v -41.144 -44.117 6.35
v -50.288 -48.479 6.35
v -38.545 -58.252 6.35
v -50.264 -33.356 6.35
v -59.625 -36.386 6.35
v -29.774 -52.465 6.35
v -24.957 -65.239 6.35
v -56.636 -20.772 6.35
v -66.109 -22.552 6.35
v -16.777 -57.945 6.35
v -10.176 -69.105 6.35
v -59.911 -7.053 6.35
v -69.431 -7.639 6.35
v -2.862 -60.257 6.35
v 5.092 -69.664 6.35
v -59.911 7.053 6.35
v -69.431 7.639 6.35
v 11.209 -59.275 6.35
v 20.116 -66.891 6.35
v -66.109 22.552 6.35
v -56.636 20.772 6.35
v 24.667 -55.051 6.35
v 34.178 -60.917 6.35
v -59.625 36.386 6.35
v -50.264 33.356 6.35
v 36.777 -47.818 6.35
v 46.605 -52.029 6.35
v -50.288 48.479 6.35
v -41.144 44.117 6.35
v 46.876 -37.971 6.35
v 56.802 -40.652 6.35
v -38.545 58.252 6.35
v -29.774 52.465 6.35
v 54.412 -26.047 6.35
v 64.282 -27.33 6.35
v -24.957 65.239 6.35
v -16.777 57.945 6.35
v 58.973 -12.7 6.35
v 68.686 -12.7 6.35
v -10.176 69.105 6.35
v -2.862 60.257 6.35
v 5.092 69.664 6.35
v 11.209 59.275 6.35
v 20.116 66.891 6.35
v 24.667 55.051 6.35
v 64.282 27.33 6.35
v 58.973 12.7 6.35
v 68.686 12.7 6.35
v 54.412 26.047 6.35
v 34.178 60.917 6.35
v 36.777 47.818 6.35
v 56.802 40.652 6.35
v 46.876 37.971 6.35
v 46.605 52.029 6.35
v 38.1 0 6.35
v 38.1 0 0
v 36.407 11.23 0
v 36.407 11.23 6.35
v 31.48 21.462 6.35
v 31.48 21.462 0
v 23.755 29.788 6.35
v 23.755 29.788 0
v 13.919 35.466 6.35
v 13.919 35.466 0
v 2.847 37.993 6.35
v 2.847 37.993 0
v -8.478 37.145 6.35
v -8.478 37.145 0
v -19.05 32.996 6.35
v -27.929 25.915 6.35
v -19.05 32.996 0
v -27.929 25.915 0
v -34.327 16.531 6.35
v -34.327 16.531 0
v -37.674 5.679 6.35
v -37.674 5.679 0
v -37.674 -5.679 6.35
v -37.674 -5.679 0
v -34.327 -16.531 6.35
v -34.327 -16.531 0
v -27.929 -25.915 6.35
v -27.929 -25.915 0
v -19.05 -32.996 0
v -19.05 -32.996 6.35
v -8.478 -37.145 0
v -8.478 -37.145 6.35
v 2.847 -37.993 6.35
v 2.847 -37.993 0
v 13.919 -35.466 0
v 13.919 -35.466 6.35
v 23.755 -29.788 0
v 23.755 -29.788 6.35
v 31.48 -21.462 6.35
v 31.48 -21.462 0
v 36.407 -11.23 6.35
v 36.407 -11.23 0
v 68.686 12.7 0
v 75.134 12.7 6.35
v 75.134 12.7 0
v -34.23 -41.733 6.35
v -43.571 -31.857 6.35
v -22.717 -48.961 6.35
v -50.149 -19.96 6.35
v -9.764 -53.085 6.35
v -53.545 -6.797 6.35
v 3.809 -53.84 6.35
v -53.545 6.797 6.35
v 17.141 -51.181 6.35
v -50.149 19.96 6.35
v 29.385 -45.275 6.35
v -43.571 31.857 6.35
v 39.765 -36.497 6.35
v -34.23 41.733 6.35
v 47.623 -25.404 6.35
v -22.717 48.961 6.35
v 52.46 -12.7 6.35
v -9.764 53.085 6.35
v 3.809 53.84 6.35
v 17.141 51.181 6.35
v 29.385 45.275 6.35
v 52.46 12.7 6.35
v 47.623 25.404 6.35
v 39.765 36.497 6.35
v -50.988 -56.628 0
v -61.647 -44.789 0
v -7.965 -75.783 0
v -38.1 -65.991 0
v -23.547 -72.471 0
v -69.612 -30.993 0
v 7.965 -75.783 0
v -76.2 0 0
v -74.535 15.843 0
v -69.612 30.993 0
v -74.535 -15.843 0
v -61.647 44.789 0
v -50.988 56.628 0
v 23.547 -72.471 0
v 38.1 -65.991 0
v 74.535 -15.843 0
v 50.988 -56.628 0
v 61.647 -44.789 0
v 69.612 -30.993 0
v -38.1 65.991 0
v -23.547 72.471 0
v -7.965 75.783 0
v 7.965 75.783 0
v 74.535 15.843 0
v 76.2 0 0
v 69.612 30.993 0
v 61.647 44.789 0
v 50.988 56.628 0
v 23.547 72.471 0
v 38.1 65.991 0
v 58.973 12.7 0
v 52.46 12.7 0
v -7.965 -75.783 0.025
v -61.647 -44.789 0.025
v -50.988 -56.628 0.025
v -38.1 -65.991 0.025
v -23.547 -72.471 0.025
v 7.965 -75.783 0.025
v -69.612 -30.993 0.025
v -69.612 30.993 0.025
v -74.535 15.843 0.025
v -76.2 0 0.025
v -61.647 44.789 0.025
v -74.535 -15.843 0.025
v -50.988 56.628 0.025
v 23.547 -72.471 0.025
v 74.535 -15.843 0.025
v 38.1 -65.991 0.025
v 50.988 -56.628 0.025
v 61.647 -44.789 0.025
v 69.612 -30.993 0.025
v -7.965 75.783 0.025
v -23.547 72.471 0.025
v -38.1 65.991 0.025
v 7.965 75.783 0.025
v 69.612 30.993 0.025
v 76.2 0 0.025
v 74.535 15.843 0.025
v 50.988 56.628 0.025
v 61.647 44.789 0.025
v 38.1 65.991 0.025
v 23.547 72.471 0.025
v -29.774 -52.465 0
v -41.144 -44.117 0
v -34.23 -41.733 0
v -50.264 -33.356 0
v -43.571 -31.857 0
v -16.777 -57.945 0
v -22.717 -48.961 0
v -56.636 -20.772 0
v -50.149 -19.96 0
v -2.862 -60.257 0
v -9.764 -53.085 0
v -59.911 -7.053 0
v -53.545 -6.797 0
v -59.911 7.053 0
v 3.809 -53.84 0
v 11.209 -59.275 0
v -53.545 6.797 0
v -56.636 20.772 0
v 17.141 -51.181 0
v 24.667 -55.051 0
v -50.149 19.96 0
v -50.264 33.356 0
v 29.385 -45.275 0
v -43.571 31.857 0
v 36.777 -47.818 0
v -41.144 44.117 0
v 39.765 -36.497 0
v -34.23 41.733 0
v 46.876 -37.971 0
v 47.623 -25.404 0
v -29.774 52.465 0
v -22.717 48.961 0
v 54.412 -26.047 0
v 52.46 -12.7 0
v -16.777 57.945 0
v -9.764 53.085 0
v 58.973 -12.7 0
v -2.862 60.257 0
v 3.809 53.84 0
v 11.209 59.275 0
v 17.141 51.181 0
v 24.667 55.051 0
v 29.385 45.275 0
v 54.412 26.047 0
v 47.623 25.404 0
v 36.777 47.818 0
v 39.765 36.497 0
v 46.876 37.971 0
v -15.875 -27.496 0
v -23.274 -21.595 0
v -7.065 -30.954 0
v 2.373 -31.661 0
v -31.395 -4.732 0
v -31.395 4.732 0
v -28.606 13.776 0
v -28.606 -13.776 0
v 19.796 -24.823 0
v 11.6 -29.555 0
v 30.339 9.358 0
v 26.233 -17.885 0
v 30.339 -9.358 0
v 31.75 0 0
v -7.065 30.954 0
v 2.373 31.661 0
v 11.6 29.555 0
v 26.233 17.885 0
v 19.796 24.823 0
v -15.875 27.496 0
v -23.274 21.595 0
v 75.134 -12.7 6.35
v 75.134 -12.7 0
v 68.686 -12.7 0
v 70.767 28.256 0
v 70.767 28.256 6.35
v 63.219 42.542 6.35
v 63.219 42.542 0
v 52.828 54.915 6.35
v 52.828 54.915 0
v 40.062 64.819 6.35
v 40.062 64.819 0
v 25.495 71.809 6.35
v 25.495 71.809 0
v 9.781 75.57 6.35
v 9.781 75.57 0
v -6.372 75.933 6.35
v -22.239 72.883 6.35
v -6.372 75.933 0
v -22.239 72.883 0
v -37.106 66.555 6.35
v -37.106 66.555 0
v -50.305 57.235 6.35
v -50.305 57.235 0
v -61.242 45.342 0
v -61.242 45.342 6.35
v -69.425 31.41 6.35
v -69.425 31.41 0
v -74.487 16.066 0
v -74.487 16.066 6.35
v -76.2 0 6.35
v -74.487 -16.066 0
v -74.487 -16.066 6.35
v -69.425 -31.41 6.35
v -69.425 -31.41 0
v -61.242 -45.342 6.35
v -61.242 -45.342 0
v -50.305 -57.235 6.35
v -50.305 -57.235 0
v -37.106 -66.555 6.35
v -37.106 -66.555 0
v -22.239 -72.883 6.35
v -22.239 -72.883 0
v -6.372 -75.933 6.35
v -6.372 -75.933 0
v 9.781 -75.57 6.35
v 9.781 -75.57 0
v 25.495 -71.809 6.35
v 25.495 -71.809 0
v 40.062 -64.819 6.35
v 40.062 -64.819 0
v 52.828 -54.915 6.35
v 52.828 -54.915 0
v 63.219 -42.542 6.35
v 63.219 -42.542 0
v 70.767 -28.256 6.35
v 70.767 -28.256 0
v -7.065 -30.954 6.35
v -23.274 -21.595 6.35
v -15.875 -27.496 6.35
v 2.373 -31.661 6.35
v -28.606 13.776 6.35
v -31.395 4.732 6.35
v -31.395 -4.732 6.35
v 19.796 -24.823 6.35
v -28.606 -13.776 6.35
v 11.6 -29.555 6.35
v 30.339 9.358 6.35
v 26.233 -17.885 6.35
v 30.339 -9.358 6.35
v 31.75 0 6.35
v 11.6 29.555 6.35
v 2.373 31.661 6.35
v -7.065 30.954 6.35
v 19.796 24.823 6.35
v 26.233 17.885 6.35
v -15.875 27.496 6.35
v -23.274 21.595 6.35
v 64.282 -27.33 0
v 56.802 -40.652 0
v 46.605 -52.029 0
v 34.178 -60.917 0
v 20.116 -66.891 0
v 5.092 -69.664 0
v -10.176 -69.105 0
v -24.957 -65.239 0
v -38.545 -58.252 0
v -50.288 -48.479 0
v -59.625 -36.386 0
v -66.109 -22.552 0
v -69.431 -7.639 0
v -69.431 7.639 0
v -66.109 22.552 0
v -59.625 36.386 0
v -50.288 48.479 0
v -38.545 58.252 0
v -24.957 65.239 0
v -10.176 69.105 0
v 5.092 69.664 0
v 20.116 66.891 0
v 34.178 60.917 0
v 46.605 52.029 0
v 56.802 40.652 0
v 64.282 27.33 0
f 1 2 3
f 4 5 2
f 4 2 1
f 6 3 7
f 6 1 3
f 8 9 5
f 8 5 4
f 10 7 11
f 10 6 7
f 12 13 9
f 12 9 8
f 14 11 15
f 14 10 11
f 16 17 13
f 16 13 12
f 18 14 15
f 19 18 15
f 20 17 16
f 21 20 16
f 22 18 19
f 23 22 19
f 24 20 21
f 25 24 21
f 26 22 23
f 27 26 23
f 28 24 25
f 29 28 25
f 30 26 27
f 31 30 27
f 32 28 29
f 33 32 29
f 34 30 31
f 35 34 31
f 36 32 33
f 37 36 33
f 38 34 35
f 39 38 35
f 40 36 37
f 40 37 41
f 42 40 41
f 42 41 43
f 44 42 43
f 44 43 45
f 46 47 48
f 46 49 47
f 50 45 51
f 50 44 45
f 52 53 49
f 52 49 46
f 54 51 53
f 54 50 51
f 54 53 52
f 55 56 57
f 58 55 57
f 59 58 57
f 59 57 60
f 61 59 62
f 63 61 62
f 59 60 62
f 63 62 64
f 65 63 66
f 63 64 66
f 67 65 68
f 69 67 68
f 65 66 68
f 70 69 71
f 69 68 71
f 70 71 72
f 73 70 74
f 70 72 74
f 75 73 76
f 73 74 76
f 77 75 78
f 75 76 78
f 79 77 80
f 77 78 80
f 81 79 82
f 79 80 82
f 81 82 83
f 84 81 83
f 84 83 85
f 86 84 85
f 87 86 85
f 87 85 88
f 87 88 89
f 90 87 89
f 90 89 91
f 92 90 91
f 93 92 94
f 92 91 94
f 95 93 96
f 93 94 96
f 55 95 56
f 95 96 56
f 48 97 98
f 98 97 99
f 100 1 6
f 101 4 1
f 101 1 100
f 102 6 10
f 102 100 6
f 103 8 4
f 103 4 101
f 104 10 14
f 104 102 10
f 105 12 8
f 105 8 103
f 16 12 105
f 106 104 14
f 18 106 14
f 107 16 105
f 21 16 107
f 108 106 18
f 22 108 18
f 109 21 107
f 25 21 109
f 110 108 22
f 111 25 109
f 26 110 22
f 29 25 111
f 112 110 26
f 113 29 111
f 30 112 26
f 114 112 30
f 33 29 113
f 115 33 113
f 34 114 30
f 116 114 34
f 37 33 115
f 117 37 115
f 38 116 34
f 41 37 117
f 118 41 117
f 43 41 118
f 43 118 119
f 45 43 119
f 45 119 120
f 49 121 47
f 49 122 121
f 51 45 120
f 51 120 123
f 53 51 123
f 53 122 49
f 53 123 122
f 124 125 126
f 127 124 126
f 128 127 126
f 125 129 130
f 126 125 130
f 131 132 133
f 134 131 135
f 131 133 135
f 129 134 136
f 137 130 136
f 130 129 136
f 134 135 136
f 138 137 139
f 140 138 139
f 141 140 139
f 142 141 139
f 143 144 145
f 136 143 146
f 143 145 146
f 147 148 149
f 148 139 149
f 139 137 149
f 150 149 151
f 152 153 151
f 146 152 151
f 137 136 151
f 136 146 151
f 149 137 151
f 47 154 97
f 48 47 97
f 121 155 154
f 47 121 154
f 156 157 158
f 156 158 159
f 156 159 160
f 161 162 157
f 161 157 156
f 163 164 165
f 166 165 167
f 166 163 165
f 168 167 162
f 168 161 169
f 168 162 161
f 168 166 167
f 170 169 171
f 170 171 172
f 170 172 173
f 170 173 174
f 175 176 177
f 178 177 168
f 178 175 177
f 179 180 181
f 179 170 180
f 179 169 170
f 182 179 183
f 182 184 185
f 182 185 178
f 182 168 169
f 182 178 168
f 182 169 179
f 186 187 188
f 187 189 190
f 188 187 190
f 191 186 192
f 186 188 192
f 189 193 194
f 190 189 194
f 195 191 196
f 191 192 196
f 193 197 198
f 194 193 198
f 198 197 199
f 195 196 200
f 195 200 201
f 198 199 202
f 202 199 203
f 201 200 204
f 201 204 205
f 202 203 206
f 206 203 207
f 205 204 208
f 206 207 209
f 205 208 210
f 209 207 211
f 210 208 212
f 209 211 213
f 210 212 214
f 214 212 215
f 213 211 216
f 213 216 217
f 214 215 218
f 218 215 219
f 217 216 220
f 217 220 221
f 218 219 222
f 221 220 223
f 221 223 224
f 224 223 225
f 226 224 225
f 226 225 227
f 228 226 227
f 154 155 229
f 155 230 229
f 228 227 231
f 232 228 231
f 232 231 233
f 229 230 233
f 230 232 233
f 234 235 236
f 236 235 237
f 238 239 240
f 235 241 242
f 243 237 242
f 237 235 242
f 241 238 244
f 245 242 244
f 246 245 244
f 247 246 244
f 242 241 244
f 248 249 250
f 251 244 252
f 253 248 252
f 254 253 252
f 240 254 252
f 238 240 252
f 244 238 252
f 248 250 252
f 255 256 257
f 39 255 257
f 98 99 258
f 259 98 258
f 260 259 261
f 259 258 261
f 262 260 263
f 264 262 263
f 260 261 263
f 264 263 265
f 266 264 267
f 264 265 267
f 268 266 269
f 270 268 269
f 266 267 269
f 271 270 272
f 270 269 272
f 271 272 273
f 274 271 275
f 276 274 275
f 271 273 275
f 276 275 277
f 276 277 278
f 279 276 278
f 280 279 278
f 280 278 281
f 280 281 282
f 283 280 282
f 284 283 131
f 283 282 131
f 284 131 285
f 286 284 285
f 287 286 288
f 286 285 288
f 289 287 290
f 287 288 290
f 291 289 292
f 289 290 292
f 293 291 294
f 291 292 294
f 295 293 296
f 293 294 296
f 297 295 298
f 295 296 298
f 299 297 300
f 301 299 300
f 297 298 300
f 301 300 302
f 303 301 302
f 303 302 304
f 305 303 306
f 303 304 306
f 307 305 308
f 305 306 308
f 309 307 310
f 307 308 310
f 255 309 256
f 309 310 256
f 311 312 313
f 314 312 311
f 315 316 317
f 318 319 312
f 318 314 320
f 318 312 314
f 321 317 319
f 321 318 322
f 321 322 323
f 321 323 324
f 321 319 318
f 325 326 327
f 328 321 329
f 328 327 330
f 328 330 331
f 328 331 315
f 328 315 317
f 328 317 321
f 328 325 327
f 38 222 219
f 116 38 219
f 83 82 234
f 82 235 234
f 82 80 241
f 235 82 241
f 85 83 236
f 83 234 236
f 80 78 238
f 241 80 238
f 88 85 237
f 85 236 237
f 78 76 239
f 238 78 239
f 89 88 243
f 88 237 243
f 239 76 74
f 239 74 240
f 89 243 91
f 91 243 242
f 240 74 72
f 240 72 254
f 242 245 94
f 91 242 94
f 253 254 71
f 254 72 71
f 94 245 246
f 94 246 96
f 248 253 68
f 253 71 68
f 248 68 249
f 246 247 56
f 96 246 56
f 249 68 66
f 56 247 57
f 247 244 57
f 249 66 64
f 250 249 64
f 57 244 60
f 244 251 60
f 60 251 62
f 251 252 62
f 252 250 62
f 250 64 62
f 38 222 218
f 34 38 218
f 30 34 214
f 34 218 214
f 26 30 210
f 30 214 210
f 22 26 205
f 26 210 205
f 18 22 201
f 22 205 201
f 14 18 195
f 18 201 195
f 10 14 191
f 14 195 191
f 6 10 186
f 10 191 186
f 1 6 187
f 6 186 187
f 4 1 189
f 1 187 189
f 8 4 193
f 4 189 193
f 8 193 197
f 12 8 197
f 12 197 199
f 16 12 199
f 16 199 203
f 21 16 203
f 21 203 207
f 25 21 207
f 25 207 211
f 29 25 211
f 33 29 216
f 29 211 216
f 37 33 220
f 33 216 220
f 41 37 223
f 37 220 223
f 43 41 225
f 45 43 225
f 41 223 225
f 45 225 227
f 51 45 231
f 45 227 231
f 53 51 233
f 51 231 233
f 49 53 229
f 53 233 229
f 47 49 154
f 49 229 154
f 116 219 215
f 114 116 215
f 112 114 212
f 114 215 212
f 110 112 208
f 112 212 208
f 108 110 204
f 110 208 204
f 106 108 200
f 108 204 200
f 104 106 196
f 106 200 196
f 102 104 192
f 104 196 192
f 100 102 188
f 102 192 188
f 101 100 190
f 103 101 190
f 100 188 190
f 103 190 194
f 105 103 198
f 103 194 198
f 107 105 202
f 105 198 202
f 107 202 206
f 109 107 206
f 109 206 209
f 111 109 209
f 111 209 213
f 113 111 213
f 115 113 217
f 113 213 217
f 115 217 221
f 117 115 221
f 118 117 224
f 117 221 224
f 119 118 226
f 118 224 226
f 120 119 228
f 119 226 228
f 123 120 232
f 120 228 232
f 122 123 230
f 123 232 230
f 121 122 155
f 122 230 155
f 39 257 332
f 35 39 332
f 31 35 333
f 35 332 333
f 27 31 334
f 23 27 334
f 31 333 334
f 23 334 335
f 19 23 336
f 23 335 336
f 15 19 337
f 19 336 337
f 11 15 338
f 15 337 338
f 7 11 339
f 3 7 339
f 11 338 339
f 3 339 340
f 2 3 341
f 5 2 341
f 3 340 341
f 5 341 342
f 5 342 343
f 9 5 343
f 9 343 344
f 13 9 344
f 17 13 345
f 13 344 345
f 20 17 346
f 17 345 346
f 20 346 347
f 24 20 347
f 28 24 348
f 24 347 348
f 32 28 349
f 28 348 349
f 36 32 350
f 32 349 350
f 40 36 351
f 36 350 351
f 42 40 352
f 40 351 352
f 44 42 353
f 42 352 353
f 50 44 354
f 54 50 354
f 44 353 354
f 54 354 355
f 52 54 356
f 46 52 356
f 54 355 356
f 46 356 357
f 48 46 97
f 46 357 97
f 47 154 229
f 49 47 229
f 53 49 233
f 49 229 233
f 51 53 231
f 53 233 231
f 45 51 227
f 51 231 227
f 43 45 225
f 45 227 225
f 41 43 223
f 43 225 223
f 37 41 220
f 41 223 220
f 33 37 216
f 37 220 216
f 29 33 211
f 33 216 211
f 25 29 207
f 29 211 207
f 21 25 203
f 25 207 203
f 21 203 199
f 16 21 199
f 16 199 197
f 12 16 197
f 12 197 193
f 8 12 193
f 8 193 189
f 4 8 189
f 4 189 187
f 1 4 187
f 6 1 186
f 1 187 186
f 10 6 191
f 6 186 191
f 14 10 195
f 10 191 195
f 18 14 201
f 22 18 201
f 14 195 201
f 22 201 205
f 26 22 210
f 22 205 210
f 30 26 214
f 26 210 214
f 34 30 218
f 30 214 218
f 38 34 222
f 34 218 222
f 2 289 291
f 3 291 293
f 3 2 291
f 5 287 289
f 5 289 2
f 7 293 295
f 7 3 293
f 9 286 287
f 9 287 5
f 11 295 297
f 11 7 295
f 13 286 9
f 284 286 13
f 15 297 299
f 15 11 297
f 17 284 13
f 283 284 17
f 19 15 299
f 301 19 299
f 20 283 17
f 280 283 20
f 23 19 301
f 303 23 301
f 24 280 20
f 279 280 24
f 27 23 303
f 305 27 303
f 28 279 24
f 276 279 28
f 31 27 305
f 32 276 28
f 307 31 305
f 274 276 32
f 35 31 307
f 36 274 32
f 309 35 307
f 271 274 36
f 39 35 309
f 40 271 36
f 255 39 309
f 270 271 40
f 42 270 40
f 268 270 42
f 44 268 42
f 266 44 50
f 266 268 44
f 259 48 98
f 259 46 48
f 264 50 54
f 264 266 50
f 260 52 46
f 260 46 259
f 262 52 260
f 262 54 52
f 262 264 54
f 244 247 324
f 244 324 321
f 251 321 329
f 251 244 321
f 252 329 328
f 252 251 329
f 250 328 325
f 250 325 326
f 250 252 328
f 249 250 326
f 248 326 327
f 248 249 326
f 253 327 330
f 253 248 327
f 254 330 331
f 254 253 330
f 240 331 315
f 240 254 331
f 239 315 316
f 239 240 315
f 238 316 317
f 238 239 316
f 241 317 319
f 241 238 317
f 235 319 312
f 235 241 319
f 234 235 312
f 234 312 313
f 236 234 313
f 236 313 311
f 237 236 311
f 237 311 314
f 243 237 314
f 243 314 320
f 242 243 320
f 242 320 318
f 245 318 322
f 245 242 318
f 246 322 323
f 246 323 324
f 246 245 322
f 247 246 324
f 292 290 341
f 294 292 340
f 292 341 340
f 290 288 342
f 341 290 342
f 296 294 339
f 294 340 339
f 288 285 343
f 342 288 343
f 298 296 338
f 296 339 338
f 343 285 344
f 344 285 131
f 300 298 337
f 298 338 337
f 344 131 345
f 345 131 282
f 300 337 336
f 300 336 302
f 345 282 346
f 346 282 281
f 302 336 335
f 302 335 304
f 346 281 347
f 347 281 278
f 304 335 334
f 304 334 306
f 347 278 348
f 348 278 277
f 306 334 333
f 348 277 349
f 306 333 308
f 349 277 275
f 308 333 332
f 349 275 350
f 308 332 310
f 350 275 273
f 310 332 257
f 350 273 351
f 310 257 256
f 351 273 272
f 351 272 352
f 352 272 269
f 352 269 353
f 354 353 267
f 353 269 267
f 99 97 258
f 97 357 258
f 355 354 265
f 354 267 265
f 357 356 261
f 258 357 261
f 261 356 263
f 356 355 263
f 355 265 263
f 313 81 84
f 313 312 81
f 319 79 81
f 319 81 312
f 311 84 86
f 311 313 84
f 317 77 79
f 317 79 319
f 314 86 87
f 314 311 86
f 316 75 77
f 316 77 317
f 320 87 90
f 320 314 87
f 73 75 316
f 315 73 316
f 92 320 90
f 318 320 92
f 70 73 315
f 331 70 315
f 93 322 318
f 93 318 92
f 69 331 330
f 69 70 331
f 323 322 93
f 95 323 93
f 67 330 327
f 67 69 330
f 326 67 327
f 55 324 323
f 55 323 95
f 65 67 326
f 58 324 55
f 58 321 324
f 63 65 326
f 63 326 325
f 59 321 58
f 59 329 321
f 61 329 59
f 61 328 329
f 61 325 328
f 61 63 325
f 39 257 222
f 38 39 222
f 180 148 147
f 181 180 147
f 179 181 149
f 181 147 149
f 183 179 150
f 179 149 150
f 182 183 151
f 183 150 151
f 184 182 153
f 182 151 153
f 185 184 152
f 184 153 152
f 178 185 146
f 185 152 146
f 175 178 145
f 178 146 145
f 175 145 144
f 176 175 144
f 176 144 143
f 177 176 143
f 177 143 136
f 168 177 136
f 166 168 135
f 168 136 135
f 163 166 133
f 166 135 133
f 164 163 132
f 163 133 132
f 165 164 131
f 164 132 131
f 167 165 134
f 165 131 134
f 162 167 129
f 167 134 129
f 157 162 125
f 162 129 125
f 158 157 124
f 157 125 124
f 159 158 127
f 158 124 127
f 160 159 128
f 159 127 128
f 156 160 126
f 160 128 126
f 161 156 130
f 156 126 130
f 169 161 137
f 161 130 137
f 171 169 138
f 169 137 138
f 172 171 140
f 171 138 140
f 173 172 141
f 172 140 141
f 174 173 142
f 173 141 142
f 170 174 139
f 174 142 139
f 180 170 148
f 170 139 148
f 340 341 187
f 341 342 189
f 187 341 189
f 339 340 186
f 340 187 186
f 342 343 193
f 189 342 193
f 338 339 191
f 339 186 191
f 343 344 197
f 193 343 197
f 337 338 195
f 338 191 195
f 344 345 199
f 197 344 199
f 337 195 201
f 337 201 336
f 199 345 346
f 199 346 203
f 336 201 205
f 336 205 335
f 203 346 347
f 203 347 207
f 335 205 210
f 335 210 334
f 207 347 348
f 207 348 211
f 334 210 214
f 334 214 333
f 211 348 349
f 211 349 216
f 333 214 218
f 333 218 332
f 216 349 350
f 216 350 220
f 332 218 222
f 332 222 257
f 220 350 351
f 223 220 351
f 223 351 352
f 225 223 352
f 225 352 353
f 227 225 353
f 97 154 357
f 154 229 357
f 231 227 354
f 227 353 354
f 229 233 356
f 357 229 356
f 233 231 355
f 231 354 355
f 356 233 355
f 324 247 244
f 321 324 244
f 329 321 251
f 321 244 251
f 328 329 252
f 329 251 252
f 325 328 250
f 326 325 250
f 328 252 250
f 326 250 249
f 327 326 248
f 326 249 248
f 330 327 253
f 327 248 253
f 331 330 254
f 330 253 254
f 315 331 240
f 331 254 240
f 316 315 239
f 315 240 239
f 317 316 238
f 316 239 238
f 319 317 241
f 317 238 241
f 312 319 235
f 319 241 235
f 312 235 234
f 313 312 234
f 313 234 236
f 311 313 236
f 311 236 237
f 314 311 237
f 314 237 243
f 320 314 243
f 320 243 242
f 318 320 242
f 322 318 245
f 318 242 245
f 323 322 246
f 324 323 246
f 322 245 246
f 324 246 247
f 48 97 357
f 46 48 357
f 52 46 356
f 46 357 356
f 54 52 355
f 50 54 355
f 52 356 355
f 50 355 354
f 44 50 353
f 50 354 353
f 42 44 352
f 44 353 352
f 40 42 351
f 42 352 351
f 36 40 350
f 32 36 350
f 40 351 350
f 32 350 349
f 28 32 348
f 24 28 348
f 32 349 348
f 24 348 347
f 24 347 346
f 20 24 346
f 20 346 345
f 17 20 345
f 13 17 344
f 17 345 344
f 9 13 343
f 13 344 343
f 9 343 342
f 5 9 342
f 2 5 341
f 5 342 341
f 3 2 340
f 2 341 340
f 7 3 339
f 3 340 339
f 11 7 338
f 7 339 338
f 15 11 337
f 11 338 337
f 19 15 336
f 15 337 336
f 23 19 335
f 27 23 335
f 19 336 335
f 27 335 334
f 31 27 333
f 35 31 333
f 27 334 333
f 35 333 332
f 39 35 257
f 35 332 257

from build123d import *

# Parameters (mm, degrees)
F1_DEPTH = 6.35
F0_R     = 31.75
F2_R     = 38.1
F2_R_2   = 31.75
F3_DEPTH = 6.35
F4_R     = 76.2
F5_DEPTH = 0.0254


with BuildPart() as f1:
    # F0 (on Top) → F1 (new body)
    with BuildSketch(Plane.XY):
        with BuildLine():
            Line((58.9730075967, 12.7), (68.6857517976, 12.7))
            ThreePointArc((68.6857517976, 12.7), (-69.85, 0), (68.6857517976, -12.7))
            Line((68.6857517976, -12.7), (58.9730075967, -12.7))
            ThreePointArc((58.9730075967, -12.7), (-60.325, 0), (58.9730075967, 12.7))
        make_face()
    extrude(amount=F1_DEPTH)


with BuildPart() as f1b:
    # F0 (on Top) → F1, piece 2 (new body)
    with BuildSketch(Plane.XY):
        Circle(F0_R)
    extrude(amount=F1_DEPTH)


with BuildPart() as f3:
    # F2 (on Top) → F3 (new body)
    with BuildSketch(Plane.XY):
        Circle(F2_R)
        Circle(F2_R_2, mode=Mode.SUBTRACT)
    extrude(amount=F3_DEPTH)


with BuildPart() as f3b:
    # F2 (on Top) → F3, piece 2 (new body)
    with BuildSketch(Plane.XY):
        with BuildLine():
            Line((52.4596094629, 12.7), (58.9730075967, 12.7))
            ThreePointArc((58.9730075967, 12.7), (-60.325, 0), (58.9730075967, -12.7))
            Line((58.9730075967, -12.7), (52.4596094629, -12.7))
            ThreePointArc((52.4596094629, -12.7), (-53.975, 0), (52.4596094629, 12.7))
        make_face()
    extrude(amount=F3_DEPTH)


with BuildPart() as f3c:
    # F2 (on Top) → F3, piece 3 (new body)
    with BuildSketch(Plane.XY):
        with BuildLine():
            Line((68.6857517976, 12.7), (75.1342132454, 12.7))
            ThreePointArc((75.1342132454, 12.7), (-76.2, 0), (75.1342132454, -12.7))
            Line((75.1342132454, -12.7), (68.6857517976, -12.7))
            ThreePointArc((68.6857517976, -12.7), (-69.85, 0), (68.6857517976, 12.7))
        make_face()
    extrude(amount=F3_DEPTH)


with BuildPart() as f5:
    # F4 (on Top) → F5 (new body)
    with BuildSketch(Plane.XY):
        Circle(F4_R)
    extrude(amount=F5_DEPTH)


solid = Compound([f1.part, f1b.part, f3.part, f3b.part, f3c.part, f5.part])
